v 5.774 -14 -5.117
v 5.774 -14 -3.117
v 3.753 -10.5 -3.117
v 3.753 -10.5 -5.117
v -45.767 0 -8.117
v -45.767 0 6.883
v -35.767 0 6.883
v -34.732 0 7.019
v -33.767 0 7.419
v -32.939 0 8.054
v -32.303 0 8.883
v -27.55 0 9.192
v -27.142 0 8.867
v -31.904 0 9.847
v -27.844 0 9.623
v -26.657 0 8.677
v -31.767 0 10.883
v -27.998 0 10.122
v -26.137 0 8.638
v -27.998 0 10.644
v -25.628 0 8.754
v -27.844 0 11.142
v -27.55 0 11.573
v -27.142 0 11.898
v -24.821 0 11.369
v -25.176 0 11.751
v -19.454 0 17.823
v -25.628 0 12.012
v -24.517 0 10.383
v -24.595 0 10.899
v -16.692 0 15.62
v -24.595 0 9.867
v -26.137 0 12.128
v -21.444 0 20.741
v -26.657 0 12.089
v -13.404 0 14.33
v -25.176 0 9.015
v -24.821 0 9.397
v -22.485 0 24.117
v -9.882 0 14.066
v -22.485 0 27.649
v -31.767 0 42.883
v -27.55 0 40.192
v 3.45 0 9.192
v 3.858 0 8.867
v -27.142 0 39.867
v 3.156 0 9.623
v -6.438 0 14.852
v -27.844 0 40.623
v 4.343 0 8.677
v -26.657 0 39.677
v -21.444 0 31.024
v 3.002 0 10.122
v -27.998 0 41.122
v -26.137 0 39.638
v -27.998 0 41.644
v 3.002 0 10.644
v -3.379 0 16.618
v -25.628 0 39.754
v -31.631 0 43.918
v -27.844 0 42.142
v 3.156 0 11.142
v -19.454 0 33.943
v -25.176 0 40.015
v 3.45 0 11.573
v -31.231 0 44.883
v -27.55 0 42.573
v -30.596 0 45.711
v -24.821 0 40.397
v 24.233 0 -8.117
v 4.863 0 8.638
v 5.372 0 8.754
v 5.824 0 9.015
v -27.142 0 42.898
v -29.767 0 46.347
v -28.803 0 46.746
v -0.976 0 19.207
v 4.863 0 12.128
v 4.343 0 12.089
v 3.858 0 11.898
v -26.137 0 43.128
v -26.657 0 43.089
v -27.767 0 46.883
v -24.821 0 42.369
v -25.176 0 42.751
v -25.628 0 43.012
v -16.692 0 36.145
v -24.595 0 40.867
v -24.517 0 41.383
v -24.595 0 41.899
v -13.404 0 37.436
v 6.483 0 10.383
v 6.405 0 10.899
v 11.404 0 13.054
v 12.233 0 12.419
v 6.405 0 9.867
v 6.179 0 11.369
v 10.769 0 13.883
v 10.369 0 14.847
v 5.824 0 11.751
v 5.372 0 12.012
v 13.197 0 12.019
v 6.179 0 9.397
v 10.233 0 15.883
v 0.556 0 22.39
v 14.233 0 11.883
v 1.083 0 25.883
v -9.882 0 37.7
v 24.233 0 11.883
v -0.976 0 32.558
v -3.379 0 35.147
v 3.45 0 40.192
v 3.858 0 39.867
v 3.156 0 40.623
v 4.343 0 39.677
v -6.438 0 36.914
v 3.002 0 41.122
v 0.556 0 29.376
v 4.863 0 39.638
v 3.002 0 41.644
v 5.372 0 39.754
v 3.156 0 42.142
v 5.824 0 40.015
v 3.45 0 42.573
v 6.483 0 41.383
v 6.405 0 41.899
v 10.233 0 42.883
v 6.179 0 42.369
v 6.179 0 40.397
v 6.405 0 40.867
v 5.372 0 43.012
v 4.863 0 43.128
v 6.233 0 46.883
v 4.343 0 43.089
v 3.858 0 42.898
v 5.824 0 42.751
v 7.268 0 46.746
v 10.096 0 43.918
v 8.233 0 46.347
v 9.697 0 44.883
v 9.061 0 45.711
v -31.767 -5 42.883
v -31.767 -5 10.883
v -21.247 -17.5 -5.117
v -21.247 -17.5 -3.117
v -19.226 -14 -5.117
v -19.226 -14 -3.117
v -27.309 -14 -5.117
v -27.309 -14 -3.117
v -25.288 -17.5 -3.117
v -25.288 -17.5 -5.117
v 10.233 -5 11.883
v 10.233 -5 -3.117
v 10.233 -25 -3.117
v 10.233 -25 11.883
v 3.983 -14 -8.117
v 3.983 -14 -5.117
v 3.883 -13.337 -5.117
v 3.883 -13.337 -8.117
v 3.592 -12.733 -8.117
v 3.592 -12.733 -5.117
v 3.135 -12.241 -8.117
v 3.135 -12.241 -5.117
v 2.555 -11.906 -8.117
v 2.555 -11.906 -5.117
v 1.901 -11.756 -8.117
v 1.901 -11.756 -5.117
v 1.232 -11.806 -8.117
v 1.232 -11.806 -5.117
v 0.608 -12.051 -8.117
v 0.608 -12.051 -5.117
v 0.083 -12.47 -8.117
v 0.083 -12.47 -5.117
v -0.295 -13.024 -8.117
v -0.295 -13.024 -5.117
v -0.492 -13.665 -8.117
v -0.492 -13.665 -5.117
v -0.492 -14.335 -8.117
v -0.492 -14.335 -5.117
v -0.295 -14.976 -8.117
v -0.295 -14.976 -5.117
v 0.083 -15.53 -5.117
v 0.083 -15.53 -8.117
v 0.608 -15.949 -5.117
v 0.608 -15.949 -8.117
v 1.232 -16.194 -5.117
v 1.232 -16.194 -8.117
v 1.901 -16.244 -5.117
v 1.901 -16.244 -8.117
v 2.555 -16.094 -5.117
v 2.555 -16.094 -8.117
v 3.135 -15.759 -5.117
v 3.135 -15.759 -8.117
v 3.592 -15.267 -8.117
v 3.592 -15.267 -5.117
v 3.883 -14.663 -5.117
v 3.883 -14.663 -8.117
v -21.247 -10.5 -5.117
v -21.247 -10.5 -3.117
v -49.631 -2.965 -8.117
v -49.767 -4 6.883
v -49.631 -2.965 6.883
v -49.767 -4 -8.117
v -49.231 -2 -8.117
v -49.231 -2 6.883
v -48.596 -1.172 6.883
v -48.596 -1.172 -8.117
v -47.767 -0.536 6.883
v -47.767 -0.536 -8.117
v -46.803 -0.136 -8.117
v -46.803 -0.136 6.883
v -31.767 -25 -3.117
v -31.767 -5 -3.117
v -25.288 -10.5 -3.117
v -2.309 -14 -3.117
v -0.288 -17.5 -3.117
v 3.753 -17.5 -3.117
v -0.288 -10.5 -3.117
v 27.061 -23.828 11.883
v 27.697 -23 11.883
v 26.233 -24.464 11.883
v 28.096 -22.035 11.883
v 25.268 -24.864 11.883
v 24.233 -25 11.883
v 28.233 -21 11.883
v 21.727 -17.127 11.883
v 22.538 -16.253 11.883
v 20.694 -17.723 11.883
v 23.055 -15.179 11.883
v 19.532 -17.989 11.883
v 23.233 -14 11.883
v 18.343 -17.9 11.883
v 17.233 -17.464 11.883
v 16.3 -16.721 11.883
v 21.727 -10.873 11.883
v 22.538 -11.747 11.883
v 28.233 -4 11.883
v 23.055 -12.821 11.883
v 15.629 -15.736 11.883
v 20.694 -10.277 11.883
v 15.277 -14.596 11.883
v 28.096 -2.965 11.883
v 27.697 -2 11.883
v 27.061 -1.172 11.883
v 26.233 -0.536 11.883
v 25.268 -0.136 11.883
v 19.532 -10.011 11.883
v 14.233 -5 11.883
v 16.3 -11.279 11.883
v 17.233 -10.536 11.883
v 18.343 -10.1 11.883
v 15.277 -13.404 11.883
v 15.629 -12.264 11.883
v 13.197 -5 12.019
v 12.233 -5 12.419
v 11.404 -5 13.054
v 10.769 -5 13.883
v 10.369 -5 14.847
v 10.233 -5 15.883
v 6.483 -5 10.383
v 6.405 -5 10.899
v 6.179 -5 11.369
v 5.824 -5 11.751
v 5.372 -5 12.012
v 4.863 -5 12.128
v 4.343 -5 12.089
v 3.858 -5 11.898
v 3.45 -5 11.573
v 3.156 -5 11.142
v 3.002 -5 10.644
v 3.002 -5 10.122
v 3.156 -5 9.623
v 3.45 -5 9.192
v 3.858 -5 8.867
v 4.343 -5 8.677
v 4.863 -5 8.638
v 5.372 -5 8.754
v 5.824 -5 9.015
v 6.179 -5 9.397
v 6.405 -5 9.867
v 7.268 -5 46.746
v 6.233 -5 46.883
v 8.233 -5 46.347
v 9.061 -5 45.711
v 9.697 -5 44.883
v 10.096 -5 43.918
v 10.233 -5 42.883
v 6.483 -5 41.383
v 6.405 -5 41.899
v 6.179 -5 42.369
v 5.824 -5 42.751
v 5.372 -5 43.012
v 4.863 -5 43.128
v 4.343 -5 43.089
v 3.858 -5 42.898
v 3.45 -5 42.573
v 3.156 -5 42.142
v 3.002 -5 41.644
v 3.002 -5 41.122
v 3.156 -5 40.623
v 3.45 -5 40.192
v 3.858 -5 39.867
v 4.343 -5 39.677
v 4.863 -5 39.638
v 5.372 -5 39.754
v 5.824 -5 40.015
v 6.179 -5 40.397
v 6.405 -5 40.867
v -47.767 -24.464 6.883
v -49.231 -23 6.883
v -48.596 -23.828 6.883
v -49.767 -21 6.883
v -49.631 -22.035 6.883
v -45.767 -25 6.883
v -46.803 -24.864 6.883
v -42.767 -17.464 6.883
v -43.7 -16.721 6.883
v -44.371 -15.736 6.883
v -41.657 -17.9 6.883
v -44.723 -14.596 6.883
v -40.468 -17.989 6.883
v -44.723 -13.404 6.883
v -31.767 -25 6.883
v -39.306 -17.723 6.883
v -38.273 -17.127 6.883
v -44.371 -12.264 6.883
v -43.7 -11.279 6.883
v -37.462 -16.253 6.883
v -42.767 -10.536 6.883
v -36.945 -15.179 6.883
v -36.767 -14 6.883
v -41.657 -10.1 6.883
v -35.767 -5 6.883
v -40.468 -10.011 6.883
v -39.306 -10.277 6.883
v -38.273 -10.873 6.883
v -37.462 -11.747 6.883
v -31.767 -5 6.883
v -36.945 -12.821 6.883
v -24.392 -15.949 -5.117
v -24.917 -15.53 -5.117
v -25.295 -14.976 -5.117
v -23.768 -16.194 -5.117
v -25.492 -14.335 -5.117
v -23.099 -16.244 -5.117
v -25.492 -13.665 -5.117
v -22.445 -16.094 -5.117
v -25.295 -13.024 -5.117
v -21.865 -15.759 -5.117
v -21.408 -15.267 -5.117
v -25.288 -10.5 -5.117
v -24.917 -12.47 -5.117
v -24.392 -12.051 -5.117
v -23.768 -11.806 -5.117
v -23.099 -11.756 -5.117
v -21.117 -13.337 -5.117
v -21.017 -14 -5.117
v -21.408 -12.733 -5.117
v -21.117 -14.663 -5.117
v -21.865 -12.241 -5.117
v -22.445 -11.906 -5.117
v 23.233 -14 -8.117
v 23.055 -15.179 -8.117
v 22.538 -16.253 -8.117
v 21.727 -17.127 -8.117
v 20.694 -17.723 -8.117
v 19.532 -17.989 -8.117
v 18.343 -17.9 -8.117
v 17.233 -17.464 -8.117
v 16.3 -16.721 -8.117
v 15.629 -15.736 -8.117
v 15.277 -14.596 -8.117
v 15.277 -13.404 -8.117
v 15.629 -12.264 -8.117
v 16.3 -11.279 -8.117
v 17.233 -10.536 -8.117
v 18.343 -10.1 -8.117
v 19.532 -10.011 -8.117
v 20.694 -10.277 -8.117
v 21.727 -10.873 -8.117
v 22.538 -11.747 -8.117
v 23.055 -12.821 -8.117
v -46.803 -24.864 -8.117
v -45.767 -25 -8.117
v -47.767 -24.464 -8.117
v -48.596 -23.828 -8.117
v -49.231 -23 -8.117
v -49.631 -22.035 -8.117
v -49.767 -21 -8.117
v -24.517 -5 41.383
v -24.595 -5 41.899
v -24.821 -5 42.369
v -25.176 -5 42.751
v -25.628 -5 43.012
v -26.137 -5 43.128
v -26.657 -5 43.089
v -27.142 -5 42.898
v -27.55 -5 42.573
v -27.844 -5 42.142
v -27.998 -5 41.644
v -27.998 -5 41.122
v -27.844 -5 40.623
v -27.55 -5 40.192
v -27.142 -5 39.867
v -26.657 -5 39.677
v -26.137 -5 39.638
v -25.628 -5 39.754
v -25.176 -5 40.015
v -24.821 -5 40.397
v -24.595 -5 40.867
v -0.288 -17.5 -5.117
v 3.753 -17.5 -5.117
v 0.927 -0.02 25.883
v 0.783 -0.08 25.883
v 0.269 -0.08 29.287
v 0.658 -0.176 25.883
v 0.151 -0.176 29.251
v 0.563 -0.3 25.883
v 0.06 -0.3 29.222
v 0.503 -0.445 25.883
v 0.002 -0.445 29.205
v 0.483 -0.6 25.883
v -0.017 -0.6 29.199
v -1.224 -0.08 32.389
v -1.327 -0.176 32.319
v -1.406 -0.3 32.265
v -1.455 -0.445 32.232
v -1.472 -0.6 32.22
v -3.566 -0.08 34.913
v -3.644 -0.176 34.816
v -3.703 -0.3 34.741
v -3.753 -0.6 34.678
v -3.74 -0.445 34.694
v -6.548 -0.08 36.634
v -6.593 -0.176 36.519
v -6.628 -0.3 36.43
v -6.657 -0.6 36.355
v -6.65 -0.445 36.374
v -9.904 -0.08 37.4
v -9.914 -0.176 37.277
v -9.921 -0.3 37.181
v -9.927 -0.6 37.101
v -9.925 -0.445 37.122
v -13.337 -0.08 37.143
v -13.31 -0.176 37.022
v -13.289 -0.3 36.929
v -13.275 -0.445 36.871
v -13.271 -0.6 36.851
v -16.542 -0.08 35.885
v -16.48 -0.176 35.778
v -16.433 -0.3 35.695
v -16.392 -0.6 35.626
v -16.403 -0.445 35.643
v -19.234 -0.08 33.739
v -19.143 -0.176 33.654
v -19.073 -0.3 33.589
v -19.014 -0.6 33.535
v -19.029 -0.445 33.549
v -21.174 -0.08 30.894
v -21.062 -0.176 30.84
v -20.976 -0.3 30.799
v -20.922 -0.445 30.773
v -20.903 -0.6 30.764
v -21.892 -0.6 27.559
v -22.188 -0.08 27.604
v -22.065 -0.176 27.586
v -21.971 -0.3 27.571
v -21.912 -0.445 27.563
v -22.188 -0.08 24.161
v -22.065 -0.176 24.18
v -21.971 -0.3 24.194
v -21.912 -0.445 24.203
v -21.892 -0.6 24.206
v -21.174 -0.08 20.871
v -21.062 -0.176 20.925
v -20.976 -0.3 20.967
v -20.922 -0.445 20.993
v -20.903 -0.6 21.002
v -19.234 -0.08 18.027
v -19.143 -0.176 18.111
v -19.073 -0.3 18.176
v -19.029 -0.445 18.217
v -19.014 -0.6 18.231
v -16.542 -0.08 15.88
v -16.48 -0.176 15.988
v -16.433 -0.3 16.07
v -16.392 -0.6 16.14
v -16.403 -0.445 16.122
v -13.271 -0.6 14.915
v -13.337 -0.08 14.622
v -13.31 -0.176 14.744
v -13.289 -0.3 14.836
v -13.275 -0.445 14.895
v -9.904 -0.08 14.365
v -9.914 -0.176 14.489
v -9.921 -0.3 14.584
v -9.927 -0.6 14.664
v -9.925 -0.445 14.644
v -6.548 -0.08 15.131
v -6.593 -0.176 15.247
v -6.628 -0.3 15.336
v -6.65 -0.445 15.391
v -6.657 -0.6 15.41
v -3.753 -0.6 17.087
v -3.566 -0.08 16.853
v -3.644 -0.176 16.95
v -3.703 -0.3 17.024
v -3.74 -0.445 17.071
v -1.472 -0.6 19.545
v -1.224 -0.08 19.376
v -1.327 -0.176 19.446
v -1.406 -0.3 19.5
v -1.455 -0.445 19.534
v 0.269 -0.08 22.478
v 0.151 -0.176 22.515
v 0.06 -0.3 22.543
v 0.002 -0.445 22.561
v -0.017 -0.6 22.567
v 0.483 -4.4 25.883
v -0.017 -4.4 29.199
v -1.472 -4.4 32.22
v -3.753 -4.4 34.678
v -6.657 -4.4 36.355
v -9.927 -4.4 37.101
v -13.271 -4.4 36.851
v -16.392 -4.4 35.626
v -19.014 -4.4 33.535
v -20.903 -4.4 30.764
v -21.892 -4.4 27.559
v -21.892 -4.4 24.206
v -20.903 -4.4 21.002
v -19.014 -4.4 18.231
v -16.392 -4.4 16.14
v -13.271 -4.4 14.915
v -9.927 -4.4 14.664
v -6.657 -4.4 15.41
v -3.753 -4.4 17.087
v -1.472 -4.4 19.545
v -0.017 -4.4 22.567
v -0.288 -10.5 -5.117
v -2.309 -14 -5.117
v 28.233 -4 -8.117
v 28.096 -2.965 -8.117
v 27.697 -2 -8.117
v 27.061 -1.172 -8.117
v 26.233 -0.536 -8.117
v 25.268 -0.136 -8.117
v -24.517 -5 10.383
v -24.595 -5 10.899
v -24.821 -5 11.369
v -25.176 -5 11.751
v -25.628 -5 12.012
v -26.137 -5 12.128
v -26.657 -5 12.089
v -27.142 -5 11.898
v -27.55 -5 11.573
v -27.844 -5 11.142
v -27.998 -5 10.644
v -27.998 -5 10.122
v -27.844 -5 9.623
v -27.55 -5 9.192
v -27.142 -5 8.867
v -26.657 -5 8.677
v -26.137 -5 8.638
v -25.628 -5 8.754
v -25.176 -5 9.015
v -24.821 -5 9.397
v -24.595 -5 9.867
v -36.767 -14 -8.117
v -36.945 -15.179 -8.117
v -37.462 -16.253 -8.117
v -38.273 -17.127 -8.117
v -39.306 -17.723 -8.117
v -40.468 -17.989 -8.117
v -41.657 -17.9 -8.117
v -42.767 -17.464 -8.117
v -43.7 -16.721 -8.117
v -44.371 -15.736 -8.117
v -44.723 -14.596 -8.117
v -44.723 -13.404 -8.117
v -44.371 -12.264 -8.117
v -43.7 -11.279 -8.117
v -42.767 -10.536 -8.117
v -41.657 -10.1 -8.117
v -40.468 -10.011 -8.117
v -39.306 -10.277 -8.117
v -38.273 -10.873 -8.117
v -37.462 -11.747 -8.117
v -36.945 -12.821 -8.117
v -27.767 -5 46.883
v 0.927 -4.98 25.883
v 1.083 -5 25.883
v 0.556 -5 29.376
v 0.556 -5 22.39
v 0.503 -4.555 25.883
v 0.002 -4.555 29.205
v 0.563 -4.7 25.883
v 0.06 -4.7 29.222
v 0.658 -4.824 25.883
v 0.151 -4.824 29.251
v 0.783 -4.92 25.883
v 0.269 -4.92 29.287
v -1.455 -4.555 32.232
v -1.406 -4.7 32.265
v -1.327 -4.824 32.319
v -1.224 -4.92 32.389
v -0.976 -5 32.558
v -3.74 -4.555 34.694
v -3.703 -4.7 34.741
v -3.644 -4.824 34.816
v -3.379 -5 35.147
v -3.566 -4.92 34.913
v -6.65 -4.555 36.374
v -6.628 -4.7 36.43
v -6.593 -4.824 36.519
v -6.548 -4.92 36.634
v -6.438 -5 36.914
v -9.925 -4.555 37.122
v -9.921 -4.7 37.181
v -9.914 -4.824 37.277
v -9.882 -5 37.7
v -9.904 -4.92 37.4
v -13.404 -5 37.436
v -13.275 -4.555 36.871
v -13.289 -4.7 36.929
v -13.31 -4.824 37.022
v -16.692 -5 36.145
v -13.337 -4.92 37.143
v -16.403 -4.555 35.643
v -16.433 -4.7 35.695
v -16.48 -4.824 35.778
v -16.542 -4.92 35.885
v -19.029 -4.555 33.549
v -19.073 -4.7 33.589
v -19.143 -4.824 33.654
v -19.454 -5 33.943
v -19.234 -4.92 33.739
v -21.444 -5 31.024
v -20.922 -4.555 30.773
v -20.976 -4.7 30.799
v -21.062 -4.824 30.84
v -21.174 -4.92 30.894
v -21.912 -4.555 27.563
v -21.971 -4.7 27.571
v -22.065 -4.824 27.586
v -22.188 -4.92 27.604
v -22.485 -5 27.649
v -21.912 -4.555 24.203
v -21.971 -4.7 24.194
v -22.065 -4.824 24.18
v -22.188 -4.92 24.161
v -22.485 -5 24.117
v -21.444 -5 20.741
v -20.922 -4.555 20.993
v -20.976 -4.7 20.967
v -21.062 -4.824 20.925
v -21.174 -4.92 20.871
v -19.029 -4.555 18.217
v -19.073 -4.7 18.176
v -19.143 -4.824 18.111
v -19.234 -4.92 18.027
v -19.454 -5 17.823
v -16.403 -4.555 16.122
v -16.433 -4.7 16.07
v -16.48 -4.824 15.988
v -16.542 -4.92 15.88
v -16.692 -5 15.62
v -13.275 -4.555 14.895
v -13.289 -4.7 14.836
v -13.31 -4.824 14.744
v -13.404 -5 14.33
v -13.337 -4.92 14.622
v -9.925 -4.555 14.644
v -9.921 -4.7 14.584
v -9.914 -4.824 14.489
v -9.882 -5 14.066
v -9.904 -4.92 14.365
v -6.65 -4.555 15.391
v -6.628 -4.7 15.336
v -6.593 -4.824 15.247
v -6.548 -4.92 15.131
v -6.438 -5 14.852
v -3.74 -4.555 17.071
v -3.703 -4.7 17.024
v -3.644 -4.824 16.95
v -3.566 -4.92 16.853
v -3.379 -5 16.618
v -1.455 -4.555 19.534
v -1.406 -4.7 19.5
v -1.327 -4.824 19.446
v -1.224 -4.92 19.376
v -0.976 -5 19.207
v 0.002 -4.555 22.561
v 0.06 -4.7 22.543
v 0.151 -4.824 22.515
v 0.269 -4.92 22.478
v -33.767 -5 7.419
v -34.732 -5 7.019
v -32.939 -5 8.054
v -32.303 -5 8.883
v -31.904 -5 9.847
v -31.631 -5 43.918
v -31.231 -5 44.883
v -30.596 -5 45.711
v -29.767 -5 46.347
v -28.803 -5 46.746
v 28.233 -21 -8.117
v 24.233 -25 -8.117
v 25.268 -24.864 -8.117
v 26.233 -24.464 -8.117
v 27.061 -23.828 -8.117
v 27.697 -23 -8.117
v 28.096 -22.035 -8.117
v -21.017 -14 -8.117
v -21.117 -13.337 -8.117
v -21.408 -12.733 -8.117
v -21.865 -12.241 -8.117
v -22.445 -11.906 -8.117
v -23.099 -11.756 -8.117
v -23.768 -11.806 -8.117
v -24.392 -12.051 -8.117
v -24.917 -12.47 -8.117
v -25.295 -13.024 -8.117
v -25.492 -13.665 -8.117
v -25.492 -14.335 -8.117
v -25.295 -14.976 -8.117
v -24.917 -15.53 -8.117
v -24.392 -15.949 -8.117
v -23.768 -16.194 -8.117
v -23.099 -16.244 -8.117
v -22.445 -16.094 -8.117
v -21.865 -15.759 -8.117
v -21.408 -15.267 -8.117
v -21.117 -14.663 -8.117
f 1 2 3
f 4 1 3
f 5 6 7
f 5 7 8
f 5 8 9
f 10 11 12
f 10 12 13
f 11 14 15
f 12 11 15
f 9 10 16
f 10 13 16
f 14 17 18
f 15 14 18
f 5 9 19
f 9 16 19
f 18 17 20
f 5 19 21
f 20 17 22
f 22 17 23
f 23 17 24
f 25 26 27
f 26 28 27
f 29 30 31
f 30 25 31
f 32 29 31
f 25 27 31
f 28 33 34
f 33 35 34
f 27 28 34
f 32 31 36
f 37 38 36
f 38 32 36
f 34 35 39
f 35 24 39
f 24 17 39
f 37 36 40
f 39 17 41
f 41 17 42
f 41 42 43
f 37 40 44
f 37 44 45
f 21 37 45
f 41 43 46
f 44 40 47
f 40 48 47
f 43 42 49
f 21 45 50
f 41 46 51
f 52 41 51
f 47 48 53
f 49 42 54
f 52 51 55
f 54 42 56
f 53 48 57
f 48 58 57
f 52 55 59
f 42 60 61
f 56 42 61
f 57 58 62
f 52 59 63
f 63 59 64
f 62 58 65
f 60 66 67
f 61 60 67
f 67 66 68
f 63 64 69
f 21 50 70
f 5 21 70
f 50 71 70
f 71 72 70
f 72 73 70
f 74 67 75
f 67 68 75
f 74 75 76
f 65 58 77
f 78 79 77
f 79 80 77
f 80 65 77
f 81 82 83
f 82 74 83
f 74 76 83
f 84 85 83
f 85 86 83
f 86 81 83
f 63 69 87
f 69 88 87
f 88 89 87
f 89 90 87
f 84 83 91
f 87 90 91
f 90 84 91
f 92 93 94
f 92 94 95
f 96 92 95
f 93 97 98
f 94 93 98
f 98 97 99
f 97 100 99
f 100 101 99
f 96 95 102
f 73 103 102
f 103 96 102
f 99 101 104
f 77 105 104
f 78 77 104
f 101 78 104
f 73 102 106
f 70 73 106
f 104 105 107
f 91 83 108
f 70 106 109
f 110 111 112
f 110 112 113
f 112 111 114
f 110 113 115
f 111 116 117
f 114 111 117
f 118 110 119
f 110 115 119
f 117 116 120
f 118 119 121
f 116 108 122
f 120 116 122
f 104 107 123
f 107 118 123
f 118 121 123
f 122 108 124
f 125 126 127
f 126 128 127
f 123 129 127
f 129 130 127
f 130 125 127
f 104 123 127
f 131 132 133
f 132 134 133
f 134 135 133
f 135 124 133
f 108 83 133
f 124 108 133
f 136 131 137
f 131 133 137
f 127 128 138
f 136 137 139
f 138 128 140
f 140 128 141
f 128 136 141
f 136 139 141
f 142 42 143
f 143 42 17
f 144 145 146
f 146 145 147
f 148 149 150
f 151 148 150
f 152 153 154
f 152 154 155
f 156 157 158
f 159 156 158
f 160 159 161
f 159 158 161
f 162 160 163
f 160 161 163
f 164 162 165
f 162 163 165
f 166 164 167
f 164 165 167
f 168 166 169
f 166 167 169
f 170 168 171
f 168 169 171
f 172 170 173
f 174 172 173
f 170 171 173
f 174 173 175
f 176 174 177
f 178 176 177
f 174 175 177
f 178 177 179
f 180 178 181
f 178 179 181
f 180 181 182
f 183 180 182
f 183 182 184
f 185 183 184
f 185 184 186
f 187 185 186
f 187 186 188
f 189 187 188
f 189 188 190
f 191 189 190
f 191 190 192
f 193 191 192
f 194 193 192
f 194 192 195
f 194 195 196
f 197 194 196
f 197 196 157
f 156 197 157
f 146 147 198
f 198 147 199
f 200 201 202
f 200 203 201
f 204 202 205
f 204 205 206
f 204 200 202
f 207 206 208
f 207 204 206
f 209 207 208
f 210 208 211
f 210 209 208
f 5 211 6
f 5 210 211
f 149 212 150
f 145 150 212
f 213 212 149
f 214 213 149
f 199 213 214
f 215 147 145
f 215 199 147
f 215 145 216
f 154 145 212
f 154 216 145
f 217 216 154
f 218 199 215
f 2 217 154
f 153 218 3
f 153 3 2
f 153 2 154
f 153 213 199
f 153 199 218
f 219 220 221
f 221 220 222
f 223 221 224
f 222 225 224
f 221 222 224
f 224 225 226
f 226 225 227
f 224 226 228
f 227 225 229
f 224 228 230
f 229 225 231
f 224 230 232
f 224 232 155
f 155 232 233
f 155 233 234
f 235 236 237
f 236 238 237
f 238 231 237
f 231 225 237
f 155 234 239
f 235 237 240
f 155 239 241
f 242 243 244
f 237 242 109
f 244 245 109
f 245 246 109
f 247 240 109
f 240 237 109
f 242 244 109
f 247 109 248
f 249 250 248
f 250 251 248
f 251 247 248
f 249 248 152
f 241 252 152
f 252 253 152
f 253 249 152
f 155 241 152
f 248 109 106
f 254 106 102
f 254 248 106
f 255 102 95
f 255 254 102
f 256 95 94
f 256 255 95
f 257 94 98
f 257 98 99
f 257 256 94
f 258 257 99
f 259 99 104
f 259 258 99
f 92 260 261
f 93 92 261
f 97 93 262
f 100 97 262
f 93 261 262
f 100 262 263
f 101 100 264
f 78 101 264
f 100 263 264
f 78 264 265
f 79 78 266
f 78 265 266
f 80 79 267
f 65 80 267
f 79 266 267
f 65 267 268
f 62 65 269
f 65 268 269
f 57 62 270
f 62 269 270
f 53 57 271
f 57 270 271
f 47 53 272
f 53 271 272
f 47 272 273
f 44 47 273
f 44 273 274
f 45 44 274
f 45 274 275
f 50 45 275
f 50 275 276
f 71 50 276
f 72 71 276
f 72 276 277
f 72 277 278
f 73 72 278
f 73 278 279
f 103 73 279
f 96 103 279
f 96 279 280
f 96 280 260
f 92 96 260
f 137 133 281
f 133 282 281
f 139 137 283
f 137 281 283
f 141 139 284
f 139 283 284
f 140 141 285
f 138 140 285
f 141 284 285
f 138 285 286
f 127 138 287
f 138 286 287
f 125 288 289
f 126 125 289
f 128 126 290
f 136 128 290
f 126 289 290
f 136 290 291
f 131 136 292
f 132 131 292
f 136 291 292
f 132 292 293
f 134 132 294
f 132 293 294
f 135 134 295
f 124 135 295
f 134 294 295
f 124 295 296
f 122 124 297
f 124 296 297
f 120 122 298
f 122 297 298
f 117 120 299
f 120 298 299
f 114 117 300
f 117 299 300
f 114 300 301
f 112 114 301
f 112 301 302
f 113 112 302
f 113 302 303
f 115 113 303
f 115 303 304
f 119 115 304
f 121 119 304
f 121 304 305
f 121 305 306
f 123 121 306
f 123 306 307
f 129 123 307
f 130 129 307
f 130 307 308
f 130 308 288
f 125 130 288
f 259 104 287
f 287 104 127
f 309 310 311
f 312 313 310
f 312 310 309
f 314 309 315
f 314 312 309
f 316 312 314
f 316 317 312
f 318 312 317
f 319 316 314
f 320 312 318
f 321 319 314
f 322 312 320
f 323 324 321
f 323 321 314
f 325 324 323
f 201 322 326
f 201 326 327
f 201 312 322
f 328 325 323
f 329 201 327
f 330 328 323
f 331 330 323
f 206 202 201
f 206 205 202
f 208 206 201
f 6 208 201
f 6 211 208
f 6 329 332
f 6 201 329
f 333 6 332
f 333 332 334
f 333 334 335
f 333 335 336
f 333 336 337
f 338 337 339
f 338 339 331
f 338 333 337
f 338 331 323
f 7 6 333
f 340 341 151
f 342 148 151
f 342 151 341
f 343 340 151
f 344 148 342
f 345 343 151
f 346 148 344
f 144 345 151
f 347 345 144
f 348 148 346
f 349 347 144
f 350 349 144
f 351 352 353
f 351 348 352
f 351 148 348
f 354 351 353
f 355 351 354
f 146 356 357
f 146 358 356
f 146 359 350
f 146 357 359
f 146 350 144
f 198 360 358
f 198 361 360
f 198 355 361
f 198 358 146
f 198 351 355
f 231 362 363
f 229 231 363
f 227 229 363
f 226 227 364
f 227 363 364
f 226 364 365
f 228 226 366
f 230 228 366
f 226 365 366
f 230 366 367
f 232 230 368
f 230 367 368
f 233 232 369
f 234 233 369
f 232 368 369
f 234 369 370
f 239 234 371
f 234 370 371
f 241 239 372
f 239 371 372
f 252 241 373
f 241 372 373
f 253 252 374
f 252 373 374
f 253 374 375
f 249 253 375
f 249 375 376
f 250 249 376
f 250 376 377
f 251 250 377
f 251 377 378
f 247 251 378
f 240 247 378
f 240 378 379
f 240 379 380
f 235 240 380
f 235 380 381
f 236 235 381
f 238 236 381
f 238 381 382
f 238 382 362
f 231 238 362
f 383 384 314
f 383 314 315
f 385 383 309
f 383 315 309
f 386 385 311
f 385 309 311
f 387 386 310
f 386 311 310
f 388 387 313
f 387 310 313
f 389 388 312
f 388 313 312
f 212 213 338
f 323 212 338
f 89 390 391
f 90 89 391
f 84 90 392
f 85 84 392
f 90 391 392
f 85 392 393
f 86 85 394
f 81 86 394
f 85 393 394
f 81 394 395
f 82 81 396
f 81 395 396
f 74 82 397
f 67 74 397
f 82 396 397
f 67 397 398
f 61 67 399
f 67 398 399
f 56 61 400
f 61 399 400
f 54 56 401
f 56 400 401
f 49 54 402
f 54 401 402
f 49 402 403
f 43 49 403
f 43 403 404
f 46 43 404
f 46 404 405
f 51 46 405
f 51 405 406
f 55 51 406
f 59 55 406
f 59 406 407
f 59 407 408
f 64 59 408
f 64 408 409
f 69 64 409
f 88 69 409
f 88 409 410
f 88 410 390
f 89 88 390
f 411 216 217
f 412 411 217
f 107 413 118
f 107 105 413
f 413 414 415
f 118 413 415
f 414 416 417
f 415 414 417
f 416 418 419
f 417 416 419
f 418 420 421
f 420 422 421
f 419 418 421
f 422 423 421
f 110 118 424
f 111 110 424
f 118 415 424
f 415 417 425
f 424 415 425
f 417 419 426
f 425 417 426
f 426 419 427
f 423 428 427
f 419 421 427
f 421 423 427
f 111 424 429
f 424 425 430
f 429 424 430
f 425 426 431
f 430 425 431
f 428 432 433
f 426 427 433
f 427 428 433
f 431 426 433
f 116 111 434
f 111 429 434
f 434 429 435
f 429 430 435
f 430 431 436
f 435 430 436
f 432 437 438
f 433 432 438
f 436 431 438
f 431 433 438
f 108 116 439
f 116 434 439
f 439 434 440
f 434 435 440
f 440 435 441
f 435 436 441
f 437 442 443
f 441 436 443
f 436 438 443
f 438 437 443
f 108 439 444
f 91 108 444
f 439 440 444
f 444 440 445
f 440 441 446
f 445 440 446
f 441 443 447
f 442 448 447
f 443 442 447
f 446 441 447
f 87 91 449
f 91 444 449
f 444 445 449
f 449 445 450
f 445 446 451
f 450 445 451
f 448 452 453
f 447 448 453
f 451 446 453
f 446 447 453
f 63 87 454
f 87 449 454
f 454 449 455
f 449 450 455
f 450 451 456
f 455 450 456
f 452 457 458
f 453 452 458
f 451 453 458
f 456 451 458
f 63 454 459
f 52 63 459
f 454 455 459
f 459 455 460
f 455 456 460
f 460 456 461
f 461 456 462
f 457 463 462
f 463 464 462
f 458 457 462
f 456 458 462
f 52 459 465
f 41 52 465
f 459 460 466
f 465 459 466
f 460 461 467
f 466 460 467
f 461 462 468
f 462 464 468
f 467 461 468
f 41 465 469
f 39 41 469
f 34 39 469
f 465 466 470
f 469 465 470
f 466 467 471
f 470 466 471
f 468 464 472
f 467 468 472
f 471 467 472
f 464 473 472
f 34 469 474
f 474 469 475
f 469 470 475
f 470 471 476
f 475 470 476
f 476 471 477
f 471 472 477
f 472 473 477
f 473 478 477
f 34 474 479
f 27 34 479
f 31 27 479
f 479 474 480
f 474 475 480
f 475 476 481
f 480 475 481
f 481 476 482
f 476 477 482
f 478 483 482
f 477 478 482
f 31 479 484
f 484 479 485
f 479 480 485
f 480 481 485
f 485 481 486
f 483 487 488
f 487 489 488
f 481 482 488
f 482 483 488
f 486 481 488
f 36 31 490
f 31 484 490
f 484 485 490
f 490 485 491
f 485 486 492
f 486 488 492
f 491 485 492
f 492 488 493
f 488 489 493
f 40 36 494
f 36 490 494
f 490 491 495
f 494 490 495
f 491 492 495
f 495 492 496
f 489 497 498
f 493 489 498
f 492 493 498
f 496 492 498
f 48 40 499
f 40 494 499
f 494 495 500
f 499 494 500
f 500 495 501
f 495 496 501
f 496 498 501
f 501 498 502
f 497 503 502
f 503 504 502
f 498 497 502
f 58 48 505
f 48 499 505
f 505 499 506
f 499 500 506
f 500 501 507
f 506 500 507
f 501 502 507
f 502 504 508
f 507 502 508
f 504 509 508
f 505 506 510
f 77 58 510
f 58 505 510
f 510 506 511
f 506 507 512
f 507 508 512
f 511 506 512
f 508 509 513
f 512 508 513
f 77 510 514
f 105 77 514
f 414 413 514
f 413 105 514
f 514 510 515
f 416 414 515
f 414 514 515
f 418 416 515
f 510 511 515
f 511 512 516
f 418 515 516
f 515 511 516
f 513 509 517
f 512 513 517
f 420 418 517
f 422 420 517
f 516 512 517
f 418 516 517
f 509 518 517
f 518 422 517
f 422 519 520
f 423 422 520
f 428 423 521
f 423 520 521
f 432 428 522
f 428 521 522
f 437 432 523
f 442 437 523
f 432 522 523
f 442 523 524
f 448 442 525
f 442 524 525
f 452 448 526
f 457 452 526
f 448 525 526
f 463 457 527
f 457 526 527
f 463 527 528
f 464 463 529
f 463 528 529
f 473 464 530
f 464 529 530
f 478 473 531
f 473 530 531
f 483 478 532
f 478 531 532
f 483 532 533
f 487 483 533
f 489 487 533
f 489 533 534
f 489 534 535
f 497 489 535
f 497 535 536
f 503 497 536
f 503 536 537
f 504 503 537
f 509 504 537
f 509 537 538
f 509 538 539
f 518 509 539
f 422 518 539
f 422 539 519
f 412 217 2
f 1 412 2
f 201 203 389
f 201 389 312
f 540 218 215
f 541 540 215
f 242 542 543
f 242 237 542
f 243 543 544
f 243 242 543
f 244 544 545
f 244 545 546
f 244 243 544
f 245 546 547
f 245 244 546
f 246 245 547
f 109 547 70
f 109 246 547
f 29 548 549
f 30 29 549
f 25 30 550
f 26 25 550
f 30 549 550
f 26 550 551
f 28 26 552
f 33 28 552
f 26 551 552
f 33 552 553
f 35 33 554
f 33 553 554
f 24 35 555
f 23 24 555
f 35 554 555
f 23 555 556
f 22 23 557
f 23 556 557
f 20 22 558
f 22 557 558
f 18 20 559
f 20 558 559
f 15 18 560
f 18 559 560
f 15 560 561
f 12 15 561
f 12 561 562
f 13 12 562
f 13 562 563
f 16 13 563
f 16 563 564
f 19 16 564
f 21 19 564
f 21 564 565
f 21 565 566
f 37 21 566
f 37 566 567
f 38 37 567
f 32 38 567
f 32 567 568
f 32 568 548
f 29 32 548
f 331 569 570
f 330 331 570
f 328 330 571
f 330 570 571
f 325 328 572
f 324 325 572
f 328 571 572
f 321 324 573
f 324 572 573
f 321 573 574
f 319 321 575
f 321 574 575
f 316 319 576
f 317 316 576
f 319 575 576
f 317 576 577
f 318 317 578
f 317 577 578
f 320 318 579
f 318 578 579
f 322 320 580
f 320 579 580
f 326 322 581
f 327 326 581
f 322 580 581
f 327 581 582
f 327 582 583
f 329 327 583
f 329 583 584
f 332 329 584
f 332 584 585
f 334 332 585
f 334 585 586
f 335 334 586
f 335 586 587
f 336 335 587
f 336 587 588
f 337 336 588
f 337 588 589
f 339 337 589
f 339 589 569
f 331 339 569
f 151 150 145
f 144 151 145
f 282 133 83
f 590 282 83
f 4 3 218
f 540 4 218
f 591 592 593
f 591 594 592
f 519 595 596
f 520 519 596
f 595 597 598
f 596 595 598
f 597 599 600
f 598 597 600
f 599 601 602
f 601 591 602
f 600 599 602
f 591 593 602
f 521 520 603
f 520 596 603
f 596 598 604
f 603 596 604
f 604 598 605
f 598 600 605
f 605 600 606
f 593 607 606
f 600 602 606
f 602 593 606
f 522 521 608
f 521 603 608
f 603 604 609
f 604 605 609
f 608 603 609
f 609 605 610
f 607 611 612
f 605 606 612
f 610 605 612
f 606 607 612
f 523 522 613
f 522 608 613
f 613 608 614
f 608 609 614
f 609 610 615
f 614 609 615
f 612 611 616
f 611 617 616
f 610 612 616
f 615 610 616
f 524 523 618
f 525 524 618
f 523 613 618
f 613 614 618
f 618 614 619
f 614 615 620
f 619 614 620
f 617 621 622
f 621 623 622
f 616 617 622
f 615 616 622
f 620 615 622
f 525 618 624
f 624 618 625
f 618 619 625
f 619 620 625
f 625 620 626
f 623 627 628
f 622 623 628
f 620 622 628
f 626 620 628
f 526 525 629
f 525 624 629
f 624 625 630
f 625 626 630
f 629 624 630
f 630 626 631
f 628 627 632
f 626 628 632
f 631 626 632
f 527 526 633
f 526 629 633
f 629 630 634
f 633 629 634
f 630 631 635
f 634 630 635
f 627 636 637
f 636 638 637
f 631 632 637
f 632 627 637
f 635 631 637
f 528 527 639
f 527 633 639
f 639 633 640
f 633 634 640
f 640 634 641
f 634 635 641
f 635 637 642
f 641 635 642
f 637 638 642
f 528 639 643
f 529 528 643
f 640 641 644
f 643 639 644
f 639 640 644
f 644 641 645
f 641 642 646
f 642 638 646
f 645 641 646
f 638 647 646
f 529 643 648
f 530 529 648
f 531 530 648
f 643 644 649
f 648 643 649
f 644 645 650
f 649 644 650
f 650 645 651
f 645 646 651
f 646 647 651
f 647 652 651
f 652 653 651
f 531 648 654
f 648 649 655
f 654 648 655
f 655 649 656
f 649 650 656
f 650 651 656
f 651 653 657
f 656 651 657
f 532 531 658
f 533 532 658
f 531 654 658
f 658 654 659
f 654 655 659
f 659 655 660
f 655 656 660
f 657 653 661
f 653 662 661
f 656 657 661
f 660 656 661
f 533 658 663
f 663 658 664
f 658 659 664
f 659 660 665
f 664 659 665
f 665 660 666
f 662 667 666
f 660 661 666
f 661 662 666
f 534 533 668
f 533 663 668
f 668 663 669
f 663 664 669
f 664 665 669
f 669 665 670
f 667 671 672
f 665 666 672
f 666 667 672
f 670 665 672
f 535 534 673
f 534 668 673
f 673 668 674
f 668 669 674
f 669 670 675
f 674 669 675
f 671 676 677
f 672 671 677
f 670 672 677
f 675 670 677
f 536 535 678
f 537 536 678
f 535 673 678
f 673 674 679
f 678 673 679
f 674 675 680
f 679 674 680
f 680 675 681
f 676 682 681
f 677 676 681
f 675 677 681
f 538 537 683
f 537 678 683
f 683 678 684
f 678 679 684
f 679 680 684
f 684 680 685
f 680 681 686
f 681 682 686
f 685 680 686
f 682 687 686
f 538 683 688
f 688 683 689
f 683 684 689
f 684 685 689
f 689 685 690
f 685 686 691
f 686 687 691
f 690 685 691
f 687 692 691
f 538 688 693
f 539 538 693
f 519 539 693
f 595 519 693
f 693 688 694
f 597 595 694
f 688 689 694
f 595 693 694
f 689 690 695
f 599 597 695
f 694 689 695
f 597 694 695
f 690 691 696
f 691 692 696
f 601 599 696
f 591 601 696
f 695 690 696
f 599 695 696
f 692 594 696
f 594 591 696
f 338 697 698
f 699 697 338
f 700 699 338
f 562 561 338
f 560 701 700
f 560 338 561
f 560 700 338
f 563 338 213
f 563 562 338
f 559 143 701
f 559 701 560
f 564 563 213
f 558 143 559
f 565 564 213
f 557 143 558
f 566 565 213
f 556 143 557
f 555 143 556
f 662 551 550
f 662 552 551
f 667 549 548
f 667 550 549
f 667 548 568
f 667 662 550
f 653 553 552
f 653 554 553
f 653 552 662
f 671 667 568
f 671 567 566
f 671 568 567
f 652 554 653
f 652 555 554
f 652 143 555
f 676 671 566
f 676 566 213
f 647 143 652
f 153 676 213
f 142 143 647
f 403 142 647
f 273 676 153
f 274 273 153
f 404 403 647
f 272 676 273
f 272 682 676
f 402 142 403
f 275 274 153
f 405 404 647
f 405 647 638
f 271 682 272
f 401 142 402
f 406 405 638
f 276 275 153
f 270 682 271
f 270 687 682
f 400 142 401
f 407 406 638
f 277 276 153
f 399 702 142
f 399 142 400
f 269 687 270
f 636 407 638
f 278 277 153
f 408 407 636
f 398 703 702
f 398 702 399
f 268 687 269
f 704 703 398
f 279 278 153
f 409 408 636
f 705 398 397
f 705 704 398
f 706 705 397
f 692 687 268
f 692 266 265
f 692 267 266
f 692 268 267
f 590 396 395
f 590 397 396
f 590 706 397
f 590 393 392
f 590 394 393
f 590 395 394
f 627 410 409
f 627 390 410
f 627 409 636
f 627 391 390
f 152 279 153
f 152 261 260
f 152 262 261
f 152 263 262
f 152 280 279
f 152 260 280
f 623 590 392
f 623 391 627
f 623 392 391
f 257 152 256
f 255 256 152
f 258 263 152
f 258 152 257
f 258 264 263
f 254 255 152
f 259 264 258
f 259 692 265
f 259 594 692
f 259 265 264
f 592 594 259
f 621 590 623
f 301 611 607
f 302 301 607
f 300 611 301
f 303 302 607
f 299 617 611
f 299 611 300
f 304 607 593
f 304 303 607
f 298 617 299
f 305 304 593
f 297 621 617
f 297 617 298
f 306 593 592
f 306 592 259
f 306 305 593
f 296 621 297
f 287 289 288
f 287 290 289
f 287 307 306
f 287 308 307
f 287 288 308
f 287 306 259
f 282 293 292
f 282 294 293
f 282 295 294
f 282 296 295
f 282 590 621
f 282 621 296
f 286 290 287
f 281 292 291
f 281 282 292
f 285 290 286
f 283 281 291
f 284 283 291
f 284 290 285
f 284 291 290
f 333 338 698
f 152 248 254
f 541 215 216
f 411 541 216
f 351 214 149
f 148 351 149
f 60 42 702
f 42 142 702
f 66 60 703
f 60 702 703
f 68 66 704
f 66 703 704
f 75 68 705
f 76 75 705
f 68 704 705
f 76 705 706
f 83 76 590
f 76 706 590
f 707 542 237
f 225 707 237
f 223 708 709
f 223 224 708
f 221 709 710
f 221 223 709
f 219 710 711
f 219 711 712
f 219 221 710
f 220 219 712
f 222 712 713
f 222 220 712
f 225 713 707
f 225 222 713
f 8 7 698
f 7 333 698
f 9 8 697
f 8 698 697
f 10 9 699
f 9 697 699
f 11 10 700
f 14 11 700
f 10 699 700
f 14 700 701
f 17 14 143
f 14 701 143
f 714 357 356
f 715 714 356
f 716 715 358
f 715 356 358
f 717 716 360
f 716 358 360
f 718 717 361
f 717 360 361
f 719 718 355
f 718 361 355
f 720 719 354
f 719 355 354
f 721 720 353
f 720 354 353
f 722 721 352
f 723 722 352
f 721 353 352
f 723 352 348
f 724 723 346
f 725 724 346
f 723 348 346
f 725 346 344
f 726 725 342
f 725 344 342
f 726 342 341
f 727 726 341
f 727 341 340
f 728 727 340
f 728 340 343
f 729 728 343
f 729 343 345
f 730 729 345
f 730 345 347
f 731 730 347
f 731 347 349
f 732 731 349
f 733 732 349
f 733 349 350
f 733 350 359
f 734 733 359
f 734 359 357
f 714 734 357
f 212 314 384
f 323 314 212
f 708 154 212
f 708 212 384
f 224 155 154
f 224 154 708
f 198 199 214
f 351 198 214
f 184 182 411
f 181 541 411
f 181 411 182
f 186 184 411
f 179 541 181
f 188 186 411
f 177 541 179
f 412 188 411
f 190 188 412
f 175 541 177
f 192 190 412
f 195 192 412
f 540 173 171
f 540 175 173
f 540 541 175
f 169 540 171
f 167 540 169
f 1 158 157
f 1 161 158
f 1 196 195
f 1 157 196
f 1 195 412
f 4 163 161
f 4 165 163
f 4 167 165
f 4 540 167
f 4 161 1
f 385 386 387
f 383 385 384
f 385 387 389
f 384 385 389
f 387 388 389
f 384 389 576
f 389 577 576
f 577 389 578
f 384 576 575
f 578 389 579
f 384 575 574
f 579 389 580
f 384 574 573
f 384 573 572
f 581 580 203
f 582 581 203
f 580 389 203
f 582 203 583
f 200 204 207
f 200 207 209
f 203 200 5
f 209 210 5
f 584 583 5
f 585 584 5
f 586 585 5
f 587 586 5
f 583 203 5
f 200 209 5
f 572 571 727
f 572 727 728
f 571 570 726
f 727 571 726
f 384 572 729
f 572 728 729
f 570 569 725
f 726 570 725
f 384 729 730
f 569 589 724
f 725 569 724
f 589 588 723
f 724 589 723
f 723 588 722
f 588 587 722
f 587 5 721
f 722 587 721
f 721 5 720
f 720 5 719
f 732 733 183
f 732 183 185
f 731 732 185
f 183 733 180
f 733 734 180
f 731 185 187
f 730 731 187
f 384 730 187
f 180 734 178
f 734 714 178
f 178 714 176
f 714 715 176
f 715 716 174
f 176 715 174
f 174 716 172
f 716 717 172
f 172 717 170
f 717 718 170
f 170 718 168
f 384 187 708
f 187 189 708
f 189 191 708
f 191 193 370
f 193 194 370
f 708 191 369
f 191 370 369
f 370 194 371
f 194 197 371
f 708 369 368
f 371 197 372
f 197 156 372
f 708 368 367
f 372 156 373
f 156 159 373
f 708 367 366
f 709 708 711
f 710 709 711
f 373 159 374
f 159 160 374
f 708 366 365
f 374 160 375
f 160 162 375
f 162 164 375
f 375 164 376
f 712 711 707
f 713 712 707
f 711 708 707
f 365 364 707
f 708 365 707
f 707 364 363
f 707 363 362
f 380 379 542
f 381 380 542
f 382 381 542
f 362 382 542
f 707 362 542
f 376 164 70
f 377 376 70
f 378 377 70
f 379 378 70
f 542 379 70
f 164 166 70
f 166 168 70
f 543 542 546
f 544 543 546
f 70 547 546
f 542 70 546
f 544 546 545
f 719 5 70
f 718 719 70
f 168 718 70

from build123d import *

# Parameters (mm, degrees)
F1_DEPTH  = 5
F2_W      = 18
F2_H      = 15
F2_H_2    = 20
F3_DEPTH  = 20
F4_R      = 4
F5_DEPTH  = 25
F6_R      = 1.75
F6_R_2    = 11.25
F7_DEPTH  = 25
F8_W      = 42
F8_H      = 5
F9_DEPTH  = 20
F10_R     = 2.25
F11_DEPTH = 25
F12_DEPTH = 2
F13_R     = 4
F14_R     = 0.6


with BuildPart() as f1:
    # F0 (on Front) → F1 (new body)
    with BuildSketch(Plane.XZ):
        Polygon((-49.7673791122, 6.8827710084), (-49.7673791122, -8.1172289916), (28.2326208878, -8.1172289916), (28.2326208878, 11.8827710084), (10.2326208878, 11.8827710084), (10.2326208878, 46.8827710084), (-31.7673791122, 46.8827710084), (-31.7673791122, 6.8827710084), align=None)
    extrude(amount=F1_DEPTH)

    # F2 (on face) → F3 (join)
    with BuildSketch(Plane.XZ.offset(5)):
        with Locations((-40.7673791122, -0.6172289916)):
            Rectangle(F2_W, F2_H)
        with Locations((19.2326208878, 1.8827710084)):
            Rectangle(F2_W, F2_H_2)
    extrude(amount=F3_DEPTH)

    # F4 (on face) → F5 (cut)
    with BuildSketch(Plane(origin=(0, 0, -8.1172289916), x_dir=(1, 0, 0), z_dir=(0, 0, -1))):
        with Locations((-40.7673791122, 14)):
            Circle(F4_R)
        with Locations((19.2326208878, 14)):
            Circle(F4_R)
    extrude(amount=-F5_DEPTH, mode=Mode.SUBTRACT)

    # F6 (on face) → F7 (cut)
    with BuildSketch(Plane.XZ.offset(5)):
        with Locations((-26.2673791122, 41.3827710084)):
            Circle(F6_R)
        with Locations((-26.2673791122, 10.3827710084)):
            Circle(F6_R)
        with Locations((-10.7673791122, 25.8827710084)):
            Circle(F6_R_2)
        with Locations((4.7326208878, 41.3827710084)):
            Circle(F6_R)
        with Locations((4.7326208878, 10.3827710084)):
            Circle(F6_R)
    extrude(amount=-F7_DEPTH, mode=Mode.SUBTRACT)

    # F8 (on face) → F9 (join)
    with BuildSketch(Plane.XZ.offset(5)):
        with Locations((-10.7673791122, -5.6172289916)):
            Rectangle(F8_W, F8_H)
    extrude(amount=F9_DEPTH)

    # F10 (on face) → F11 (cut)
    with BuildSketch(Plane.XY.offset(-3.1172289916)):
        with Locations((-23.2673791122, -14)):
            Circle(F10_R)
        with Locations((1.7326208878, -14)):
            Circle(F10_R)
    extrude(amount=-F11_DEPTH, mode=Mode.SUBTRACT)

    # F10 (on face) → F12 (cut)
    with BuildSketch(Plane.XY.offset(-3.1172289916)):
        Polygon((-21.24665317, -17.5), (-19.2259272279, -14), (-21.24665317, -10.5), (-25.2881050544, -10.5), (-27.3088309965, -14), (-25.2881050544, -17.5), align=None)
        with Locations((-23.2673791122, -14)):
            Circle(F10_R, mode=Mode.SUBTRACT)
        Polygon((3.75334683, -17.5), (5.7740727721, -14), (3.75334683, -10.5), (-0.2881050544, -10.5), (-2.3088309965, -14), (-0.2881050544, -17.5), align=None)
        with Locations((1.7326208878, -14)):
            Circle(F10_R, mode=Mode.SUBTRACT)
    extrude(amount=-F12_DEPTH, mode=Mode.SUBTRACT)

    # F13
    f13_edges = [f1.edges().sort_by_distance(p)[0] for p in [
        (-49.767379, -25, -0.617229),
        (28.232621, -25, 1.882771),
        (28.232621, 0, 1.882771),
        (-49.767379, 0, -0.617229),
        (-31.767379, -2.5, 46.882771),
        (10.232621, -2.5, 46.882771),
        (-31.767379, -2.5, 6.882771),
        (10.232621, -2.5, 11.882771),
    ]]
    fillet(f13_edges, radius=F13_R)

    # F14
    f14_edges = [f1.edges().sort_by_distance(p)[0] for p in [
        (-22.017379, 0, 25.882771),
        (-22.017379, -5, 25.882771),
    ]]
    fillet(f14_edges, radius=F14_R)


solid = f1.part
